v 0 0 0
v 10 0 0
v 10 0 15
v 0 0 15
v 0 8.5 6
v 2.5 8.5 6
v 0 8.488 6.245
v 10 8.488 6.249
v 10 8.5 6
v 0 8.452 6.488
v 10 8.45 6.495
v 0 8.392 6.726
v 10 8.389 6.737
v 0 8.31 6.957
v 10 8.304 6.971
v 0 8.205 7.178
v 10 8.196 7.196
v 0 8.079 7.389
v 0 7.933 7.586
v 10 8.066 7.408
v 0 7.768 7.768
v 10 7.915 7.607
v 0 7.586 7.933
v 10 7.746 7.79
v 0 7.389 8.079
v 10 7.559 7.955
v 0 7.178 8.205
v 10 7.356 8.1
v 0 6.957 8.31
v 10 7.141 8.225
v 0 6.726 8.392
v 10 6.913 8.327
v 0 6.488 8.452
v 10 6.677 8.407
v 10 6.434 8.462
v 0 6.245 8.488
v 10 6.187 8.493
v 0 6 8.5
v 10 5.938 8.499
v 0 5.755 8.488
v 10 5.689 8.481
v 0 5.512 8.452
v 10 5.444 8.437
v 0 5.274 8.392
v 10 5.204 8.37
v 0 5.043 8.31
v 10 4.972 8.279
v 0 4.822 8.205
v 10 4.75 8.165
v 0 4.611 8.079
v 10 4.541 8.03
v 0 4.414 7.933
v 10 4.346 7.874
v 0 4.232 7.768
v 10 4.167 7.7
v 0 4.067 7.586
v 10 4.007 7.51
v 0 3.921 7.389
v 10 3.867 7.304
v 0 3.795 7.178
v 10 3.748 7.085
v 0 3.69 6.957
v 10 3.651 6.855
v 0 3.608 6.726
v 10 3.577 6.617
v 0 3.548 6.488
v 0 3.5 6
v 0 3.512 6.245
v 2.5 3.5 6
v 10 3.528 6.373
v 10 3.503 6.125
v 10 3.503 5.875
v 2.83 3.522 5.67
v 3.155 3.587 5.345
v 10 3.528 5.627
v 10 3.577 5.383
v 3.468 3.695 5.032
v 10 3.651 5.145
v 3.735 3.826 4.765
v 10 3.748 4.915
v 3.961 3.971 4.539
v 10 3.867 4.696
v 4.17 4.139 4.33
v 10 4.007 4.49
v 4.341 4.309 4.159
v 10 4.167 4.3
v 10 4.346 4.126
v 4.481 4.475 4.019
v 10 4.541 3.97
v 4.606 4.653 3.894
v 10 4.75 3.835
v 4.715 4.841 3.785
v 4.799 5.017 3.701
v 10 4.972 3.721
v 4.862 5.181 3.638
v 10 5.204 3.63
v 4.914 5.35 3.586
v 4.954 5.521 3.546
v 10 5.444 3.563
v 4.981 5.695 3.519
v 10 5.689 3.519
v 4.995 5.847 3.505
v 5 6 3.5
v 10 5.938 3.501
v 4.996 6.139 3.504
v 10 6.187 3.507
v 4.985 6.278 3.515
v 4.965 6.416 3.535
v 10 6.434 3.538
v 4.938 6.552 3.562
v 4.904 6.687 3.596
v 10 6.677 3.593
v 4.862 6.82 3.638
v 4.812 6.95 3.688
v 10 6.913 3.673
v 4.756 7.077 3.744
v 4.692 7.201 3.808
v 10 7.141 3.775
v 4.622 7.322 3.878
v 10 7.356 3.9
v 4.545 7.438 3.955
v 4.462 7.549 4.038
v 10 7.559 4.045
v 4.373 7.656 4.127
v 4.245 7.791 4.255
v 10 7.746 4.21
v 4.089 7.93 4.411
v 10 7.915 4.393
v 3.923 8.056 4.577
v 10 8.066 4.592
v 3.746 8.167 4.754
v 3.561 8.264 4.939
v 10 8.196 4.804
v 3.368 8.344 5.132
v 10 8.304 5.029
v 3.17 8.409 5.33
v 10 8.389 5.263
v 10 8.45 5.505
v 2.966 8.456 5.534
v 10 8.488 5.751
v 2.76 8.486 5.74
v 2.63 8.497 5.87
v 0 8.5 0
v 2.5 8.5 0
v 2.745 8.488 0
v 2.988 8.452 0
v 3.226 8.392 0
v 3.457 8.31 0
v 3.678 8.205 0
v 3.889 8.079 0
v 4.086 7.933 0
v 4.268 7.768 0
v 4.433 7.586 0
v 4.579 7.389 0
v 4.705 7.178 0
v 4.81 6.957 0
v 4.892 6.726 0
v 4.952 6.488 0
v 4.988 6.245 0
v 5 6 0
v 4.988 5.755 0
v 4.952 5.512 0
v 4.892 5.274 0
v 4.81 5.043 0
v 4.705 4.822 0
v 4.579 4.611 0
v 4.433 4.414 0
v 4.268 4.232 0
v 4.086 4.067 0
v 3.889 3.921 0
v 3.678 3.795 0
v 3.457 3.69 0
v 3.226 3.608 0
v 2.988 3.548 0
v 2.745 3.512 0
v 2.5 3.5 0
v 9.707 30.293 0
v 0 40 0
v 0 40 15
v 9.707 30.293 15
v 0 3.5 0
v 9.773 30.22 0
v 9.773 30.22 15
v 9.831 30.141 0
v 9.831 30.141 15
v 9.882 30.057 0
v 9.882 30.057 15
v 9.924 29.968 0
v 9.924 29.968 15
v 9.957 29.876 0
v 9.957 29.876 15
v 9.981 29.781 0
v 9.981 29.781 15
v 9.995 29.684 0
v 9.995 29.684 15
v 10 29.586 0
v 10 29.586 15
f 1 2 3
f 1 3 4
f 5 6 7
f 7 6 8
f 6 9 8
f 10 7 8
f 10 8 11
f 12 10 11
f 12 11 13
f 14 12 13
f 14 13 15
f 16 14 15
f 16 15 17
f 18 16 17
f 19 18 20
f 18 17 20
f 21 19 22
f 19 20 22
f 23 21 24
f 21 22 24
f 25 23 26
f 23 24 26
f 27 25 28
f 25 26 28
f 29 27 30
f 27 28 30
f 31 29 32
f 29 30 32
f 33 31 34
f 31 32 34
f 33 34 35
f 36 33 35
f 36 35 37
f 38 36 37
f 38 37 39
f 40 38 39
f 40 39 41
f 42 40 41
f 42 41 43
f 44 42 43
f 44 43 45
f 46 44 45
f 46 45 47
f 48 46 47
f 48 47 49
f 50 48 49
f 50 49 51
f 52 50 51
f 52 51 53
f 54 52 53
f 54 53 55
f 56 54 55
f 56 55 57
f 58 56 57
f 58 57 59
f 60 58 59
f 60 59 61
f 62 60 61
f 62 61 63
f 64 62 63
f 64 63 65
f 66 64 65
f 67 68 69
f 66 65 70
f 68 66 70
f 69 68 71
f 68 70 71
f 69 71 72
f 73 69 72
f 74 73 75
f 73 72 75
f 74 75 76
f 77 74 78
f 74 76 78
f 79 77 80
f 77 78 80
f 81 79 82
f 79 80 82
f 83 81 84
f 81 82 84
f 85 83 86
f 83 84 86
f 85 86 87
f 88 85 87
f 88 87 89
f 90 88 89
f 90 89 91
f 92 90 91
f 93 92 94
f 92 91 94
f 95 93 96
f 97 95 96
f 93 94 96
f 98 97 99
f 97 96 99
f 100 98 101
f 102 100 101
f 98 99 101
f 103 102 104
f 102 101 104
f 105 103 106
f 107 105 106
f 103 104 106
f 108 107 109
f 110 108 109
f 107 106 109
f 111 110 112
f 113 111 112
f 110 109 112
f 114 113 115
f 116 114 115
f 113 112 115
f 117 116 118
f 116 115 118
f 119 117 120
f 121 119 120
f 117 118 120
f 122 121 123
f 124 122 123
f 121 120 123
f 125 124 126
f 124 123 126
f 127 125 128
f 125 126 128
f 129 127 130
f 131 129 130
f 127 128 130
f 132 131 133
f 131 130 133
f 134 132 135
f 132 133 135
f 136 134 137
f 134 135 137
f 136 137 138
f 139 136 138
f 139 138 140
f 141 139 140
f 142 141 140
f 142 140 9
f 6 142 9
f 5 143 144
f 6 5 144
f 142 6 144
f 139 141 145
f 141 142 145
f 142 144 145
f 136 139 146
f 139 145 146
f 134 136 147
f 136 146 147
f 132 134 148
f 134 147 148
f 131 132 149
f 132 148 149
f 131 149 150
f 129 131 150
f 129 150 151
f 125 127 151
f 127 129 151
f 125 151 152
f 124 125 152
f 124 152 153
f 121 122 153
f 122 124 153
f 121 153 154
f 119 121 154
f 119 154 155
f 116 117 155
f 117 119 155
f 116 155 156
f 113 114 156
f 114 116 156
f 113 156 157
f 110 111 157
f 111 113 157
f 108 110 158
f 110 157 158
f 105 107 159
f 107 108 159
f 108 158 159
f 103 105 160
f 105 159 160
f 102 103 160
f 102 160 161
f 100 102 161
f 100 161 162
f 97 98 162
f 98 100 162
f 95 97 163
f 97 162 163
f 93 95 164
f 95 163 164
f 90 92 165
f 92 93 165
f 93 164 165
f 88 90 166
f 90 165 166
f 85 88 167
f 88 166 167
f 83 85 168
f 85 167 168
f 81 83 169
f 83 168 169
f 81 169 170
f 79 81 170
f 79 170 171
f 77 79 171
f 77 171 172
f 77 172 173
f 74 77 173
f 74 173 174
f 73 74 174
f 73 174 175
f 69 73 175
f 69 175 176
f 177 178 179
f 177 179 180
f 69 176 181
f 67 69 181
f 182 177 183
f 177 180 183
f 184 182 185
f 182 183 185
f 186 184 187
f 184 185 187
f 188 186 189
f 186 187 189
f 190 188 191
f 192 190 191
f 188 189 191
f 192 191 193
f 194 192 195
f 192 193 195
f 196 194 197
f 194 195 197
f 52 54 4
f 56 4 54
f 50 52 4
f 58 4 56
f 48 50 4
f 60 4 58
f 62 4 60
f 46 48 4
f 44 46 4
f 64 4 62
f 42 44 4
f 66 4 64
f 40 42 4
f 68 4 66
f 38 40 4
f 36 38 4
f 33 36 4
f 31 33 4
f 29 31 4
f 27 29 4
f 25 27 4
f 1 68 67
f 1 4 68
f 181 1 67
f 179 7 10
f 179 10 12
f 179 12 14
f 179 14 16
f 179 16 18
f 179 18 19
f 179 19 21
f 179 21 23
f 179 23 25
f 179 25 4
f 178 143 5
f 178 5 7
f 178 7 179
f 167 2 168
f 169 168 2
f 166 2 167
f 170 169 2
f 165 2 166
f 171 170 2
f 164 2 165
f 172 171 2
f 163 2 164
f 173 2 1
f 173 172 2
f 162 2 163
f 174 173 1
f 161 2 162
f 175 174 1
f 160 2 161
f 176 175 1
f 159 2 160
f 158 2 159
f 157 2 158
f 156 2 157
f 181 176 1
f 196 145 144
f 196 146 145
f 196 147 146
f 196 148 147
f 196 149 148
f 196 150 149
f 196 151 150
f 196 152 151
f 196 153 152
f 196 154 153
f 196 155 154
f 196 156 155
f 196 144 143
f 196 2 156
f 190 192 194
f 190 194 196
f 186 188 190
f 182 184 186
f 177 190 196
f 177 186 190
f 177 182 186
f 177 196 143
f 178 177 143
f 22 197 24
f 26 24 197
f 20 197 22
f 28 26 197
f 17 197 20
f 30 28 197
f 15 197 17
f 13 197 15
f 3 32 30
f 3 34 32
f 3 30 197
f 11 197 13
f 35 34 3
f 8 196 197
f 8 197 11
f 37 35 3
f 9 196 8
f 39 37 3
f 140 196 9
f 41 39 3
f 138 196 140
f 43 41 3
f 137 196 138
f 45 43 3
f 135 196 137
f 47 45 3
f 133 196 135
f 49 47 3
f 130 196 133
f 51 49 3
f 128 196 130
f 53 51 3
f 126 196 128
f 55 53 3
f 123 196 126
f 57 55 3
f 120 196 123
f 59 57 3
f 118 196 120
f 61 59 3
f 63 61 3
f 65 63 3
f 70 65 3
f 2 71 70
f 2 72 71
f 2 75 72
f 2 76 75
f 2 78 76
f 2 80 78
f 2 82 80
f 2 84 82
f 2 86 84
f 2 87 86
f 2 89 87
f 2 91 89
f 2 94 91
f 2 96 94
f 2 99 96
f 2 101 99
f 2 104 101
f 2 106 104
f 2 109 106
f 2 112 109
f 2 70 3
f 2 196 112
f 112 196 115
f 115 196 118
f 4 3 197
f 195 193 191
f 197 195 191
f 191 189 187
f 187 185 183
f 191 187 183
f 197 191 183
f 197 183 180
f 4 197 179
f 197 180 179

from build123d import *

# Parameters (mm, degrees)
RESSALTO_EXTRUS_O1_DEPTH = 15
ESBO_O2_R                = 2.5
CORTE_EXTRUS_O1_DEPTH    = 44.874821937
ESBO_O3_R                = 2.5
CORTE_EXTRUS_O2_DEPTH    = 6
FILETE1_R                = 1


with BuildPart() as part:
    # Esboço1 → Ressalto-extrusão1 (new body)
    with BuildSketch(Plane.XY):
        Polygon((0, 0), (0, 40), (10, 30), (10, 0), align=None)
    extrude(amount=RESSALTO_EXTRUS_O1_DEPTH)

    # Esboço2 → Corte-extrusão1 (cut, through all)
    with BuildSketch(Plane(origin=(10, 0, 0), x_dir=(0, 0, -1), z_dir=(1, 0, 0))):
        with Locations(Location((-6, 6, 0), (0, 0, 90))):
            Circle(ESBO_O2_R)
    extrude(amount=-CORTE_EXTRUS_O1_DEPTH, mode=Mode.SUBTRACT)

    # Esboço3 → Corte-extrusão2 (cut)
    with BuildSketch(Plane(origin=(0, 0, 0), x_dir=(-1, 0, 0), z_dir=(0, 0, -1))):
        with Locations((-2.5, 6)):
            Circle(ESBO_O3_R)
        with BuildLine():
            Line((0, 8.5), (-2.5, 8.5))
            ThreePointArc((-2.5, 8.5), (-0.732233047, 7.767766953), (0, 6))
            Line((0, 6), (0, 8.5))
        make_face()
        with BuildLine():
            Line((0, 3.5), (0, 6))
            ThreePointArc((0, 6), (-0.732233047, 4.232233047), (-2.5, 3.5))
            Line((-2.5, 3.5), (0, 3.5))
        make_face()
    extrude(amount=-CORTE_EXTRUS_O2_DEPTH, mode=Mode.SUBTRACT)

    # Filete1
    filete1_edges = [part.edges().sort_by_distance(p)[0] for p in [
        (10, 30, 7.5),
    ]]
    fillet(filete1_edges, radius=FILETE1_R)


solid = part.part
